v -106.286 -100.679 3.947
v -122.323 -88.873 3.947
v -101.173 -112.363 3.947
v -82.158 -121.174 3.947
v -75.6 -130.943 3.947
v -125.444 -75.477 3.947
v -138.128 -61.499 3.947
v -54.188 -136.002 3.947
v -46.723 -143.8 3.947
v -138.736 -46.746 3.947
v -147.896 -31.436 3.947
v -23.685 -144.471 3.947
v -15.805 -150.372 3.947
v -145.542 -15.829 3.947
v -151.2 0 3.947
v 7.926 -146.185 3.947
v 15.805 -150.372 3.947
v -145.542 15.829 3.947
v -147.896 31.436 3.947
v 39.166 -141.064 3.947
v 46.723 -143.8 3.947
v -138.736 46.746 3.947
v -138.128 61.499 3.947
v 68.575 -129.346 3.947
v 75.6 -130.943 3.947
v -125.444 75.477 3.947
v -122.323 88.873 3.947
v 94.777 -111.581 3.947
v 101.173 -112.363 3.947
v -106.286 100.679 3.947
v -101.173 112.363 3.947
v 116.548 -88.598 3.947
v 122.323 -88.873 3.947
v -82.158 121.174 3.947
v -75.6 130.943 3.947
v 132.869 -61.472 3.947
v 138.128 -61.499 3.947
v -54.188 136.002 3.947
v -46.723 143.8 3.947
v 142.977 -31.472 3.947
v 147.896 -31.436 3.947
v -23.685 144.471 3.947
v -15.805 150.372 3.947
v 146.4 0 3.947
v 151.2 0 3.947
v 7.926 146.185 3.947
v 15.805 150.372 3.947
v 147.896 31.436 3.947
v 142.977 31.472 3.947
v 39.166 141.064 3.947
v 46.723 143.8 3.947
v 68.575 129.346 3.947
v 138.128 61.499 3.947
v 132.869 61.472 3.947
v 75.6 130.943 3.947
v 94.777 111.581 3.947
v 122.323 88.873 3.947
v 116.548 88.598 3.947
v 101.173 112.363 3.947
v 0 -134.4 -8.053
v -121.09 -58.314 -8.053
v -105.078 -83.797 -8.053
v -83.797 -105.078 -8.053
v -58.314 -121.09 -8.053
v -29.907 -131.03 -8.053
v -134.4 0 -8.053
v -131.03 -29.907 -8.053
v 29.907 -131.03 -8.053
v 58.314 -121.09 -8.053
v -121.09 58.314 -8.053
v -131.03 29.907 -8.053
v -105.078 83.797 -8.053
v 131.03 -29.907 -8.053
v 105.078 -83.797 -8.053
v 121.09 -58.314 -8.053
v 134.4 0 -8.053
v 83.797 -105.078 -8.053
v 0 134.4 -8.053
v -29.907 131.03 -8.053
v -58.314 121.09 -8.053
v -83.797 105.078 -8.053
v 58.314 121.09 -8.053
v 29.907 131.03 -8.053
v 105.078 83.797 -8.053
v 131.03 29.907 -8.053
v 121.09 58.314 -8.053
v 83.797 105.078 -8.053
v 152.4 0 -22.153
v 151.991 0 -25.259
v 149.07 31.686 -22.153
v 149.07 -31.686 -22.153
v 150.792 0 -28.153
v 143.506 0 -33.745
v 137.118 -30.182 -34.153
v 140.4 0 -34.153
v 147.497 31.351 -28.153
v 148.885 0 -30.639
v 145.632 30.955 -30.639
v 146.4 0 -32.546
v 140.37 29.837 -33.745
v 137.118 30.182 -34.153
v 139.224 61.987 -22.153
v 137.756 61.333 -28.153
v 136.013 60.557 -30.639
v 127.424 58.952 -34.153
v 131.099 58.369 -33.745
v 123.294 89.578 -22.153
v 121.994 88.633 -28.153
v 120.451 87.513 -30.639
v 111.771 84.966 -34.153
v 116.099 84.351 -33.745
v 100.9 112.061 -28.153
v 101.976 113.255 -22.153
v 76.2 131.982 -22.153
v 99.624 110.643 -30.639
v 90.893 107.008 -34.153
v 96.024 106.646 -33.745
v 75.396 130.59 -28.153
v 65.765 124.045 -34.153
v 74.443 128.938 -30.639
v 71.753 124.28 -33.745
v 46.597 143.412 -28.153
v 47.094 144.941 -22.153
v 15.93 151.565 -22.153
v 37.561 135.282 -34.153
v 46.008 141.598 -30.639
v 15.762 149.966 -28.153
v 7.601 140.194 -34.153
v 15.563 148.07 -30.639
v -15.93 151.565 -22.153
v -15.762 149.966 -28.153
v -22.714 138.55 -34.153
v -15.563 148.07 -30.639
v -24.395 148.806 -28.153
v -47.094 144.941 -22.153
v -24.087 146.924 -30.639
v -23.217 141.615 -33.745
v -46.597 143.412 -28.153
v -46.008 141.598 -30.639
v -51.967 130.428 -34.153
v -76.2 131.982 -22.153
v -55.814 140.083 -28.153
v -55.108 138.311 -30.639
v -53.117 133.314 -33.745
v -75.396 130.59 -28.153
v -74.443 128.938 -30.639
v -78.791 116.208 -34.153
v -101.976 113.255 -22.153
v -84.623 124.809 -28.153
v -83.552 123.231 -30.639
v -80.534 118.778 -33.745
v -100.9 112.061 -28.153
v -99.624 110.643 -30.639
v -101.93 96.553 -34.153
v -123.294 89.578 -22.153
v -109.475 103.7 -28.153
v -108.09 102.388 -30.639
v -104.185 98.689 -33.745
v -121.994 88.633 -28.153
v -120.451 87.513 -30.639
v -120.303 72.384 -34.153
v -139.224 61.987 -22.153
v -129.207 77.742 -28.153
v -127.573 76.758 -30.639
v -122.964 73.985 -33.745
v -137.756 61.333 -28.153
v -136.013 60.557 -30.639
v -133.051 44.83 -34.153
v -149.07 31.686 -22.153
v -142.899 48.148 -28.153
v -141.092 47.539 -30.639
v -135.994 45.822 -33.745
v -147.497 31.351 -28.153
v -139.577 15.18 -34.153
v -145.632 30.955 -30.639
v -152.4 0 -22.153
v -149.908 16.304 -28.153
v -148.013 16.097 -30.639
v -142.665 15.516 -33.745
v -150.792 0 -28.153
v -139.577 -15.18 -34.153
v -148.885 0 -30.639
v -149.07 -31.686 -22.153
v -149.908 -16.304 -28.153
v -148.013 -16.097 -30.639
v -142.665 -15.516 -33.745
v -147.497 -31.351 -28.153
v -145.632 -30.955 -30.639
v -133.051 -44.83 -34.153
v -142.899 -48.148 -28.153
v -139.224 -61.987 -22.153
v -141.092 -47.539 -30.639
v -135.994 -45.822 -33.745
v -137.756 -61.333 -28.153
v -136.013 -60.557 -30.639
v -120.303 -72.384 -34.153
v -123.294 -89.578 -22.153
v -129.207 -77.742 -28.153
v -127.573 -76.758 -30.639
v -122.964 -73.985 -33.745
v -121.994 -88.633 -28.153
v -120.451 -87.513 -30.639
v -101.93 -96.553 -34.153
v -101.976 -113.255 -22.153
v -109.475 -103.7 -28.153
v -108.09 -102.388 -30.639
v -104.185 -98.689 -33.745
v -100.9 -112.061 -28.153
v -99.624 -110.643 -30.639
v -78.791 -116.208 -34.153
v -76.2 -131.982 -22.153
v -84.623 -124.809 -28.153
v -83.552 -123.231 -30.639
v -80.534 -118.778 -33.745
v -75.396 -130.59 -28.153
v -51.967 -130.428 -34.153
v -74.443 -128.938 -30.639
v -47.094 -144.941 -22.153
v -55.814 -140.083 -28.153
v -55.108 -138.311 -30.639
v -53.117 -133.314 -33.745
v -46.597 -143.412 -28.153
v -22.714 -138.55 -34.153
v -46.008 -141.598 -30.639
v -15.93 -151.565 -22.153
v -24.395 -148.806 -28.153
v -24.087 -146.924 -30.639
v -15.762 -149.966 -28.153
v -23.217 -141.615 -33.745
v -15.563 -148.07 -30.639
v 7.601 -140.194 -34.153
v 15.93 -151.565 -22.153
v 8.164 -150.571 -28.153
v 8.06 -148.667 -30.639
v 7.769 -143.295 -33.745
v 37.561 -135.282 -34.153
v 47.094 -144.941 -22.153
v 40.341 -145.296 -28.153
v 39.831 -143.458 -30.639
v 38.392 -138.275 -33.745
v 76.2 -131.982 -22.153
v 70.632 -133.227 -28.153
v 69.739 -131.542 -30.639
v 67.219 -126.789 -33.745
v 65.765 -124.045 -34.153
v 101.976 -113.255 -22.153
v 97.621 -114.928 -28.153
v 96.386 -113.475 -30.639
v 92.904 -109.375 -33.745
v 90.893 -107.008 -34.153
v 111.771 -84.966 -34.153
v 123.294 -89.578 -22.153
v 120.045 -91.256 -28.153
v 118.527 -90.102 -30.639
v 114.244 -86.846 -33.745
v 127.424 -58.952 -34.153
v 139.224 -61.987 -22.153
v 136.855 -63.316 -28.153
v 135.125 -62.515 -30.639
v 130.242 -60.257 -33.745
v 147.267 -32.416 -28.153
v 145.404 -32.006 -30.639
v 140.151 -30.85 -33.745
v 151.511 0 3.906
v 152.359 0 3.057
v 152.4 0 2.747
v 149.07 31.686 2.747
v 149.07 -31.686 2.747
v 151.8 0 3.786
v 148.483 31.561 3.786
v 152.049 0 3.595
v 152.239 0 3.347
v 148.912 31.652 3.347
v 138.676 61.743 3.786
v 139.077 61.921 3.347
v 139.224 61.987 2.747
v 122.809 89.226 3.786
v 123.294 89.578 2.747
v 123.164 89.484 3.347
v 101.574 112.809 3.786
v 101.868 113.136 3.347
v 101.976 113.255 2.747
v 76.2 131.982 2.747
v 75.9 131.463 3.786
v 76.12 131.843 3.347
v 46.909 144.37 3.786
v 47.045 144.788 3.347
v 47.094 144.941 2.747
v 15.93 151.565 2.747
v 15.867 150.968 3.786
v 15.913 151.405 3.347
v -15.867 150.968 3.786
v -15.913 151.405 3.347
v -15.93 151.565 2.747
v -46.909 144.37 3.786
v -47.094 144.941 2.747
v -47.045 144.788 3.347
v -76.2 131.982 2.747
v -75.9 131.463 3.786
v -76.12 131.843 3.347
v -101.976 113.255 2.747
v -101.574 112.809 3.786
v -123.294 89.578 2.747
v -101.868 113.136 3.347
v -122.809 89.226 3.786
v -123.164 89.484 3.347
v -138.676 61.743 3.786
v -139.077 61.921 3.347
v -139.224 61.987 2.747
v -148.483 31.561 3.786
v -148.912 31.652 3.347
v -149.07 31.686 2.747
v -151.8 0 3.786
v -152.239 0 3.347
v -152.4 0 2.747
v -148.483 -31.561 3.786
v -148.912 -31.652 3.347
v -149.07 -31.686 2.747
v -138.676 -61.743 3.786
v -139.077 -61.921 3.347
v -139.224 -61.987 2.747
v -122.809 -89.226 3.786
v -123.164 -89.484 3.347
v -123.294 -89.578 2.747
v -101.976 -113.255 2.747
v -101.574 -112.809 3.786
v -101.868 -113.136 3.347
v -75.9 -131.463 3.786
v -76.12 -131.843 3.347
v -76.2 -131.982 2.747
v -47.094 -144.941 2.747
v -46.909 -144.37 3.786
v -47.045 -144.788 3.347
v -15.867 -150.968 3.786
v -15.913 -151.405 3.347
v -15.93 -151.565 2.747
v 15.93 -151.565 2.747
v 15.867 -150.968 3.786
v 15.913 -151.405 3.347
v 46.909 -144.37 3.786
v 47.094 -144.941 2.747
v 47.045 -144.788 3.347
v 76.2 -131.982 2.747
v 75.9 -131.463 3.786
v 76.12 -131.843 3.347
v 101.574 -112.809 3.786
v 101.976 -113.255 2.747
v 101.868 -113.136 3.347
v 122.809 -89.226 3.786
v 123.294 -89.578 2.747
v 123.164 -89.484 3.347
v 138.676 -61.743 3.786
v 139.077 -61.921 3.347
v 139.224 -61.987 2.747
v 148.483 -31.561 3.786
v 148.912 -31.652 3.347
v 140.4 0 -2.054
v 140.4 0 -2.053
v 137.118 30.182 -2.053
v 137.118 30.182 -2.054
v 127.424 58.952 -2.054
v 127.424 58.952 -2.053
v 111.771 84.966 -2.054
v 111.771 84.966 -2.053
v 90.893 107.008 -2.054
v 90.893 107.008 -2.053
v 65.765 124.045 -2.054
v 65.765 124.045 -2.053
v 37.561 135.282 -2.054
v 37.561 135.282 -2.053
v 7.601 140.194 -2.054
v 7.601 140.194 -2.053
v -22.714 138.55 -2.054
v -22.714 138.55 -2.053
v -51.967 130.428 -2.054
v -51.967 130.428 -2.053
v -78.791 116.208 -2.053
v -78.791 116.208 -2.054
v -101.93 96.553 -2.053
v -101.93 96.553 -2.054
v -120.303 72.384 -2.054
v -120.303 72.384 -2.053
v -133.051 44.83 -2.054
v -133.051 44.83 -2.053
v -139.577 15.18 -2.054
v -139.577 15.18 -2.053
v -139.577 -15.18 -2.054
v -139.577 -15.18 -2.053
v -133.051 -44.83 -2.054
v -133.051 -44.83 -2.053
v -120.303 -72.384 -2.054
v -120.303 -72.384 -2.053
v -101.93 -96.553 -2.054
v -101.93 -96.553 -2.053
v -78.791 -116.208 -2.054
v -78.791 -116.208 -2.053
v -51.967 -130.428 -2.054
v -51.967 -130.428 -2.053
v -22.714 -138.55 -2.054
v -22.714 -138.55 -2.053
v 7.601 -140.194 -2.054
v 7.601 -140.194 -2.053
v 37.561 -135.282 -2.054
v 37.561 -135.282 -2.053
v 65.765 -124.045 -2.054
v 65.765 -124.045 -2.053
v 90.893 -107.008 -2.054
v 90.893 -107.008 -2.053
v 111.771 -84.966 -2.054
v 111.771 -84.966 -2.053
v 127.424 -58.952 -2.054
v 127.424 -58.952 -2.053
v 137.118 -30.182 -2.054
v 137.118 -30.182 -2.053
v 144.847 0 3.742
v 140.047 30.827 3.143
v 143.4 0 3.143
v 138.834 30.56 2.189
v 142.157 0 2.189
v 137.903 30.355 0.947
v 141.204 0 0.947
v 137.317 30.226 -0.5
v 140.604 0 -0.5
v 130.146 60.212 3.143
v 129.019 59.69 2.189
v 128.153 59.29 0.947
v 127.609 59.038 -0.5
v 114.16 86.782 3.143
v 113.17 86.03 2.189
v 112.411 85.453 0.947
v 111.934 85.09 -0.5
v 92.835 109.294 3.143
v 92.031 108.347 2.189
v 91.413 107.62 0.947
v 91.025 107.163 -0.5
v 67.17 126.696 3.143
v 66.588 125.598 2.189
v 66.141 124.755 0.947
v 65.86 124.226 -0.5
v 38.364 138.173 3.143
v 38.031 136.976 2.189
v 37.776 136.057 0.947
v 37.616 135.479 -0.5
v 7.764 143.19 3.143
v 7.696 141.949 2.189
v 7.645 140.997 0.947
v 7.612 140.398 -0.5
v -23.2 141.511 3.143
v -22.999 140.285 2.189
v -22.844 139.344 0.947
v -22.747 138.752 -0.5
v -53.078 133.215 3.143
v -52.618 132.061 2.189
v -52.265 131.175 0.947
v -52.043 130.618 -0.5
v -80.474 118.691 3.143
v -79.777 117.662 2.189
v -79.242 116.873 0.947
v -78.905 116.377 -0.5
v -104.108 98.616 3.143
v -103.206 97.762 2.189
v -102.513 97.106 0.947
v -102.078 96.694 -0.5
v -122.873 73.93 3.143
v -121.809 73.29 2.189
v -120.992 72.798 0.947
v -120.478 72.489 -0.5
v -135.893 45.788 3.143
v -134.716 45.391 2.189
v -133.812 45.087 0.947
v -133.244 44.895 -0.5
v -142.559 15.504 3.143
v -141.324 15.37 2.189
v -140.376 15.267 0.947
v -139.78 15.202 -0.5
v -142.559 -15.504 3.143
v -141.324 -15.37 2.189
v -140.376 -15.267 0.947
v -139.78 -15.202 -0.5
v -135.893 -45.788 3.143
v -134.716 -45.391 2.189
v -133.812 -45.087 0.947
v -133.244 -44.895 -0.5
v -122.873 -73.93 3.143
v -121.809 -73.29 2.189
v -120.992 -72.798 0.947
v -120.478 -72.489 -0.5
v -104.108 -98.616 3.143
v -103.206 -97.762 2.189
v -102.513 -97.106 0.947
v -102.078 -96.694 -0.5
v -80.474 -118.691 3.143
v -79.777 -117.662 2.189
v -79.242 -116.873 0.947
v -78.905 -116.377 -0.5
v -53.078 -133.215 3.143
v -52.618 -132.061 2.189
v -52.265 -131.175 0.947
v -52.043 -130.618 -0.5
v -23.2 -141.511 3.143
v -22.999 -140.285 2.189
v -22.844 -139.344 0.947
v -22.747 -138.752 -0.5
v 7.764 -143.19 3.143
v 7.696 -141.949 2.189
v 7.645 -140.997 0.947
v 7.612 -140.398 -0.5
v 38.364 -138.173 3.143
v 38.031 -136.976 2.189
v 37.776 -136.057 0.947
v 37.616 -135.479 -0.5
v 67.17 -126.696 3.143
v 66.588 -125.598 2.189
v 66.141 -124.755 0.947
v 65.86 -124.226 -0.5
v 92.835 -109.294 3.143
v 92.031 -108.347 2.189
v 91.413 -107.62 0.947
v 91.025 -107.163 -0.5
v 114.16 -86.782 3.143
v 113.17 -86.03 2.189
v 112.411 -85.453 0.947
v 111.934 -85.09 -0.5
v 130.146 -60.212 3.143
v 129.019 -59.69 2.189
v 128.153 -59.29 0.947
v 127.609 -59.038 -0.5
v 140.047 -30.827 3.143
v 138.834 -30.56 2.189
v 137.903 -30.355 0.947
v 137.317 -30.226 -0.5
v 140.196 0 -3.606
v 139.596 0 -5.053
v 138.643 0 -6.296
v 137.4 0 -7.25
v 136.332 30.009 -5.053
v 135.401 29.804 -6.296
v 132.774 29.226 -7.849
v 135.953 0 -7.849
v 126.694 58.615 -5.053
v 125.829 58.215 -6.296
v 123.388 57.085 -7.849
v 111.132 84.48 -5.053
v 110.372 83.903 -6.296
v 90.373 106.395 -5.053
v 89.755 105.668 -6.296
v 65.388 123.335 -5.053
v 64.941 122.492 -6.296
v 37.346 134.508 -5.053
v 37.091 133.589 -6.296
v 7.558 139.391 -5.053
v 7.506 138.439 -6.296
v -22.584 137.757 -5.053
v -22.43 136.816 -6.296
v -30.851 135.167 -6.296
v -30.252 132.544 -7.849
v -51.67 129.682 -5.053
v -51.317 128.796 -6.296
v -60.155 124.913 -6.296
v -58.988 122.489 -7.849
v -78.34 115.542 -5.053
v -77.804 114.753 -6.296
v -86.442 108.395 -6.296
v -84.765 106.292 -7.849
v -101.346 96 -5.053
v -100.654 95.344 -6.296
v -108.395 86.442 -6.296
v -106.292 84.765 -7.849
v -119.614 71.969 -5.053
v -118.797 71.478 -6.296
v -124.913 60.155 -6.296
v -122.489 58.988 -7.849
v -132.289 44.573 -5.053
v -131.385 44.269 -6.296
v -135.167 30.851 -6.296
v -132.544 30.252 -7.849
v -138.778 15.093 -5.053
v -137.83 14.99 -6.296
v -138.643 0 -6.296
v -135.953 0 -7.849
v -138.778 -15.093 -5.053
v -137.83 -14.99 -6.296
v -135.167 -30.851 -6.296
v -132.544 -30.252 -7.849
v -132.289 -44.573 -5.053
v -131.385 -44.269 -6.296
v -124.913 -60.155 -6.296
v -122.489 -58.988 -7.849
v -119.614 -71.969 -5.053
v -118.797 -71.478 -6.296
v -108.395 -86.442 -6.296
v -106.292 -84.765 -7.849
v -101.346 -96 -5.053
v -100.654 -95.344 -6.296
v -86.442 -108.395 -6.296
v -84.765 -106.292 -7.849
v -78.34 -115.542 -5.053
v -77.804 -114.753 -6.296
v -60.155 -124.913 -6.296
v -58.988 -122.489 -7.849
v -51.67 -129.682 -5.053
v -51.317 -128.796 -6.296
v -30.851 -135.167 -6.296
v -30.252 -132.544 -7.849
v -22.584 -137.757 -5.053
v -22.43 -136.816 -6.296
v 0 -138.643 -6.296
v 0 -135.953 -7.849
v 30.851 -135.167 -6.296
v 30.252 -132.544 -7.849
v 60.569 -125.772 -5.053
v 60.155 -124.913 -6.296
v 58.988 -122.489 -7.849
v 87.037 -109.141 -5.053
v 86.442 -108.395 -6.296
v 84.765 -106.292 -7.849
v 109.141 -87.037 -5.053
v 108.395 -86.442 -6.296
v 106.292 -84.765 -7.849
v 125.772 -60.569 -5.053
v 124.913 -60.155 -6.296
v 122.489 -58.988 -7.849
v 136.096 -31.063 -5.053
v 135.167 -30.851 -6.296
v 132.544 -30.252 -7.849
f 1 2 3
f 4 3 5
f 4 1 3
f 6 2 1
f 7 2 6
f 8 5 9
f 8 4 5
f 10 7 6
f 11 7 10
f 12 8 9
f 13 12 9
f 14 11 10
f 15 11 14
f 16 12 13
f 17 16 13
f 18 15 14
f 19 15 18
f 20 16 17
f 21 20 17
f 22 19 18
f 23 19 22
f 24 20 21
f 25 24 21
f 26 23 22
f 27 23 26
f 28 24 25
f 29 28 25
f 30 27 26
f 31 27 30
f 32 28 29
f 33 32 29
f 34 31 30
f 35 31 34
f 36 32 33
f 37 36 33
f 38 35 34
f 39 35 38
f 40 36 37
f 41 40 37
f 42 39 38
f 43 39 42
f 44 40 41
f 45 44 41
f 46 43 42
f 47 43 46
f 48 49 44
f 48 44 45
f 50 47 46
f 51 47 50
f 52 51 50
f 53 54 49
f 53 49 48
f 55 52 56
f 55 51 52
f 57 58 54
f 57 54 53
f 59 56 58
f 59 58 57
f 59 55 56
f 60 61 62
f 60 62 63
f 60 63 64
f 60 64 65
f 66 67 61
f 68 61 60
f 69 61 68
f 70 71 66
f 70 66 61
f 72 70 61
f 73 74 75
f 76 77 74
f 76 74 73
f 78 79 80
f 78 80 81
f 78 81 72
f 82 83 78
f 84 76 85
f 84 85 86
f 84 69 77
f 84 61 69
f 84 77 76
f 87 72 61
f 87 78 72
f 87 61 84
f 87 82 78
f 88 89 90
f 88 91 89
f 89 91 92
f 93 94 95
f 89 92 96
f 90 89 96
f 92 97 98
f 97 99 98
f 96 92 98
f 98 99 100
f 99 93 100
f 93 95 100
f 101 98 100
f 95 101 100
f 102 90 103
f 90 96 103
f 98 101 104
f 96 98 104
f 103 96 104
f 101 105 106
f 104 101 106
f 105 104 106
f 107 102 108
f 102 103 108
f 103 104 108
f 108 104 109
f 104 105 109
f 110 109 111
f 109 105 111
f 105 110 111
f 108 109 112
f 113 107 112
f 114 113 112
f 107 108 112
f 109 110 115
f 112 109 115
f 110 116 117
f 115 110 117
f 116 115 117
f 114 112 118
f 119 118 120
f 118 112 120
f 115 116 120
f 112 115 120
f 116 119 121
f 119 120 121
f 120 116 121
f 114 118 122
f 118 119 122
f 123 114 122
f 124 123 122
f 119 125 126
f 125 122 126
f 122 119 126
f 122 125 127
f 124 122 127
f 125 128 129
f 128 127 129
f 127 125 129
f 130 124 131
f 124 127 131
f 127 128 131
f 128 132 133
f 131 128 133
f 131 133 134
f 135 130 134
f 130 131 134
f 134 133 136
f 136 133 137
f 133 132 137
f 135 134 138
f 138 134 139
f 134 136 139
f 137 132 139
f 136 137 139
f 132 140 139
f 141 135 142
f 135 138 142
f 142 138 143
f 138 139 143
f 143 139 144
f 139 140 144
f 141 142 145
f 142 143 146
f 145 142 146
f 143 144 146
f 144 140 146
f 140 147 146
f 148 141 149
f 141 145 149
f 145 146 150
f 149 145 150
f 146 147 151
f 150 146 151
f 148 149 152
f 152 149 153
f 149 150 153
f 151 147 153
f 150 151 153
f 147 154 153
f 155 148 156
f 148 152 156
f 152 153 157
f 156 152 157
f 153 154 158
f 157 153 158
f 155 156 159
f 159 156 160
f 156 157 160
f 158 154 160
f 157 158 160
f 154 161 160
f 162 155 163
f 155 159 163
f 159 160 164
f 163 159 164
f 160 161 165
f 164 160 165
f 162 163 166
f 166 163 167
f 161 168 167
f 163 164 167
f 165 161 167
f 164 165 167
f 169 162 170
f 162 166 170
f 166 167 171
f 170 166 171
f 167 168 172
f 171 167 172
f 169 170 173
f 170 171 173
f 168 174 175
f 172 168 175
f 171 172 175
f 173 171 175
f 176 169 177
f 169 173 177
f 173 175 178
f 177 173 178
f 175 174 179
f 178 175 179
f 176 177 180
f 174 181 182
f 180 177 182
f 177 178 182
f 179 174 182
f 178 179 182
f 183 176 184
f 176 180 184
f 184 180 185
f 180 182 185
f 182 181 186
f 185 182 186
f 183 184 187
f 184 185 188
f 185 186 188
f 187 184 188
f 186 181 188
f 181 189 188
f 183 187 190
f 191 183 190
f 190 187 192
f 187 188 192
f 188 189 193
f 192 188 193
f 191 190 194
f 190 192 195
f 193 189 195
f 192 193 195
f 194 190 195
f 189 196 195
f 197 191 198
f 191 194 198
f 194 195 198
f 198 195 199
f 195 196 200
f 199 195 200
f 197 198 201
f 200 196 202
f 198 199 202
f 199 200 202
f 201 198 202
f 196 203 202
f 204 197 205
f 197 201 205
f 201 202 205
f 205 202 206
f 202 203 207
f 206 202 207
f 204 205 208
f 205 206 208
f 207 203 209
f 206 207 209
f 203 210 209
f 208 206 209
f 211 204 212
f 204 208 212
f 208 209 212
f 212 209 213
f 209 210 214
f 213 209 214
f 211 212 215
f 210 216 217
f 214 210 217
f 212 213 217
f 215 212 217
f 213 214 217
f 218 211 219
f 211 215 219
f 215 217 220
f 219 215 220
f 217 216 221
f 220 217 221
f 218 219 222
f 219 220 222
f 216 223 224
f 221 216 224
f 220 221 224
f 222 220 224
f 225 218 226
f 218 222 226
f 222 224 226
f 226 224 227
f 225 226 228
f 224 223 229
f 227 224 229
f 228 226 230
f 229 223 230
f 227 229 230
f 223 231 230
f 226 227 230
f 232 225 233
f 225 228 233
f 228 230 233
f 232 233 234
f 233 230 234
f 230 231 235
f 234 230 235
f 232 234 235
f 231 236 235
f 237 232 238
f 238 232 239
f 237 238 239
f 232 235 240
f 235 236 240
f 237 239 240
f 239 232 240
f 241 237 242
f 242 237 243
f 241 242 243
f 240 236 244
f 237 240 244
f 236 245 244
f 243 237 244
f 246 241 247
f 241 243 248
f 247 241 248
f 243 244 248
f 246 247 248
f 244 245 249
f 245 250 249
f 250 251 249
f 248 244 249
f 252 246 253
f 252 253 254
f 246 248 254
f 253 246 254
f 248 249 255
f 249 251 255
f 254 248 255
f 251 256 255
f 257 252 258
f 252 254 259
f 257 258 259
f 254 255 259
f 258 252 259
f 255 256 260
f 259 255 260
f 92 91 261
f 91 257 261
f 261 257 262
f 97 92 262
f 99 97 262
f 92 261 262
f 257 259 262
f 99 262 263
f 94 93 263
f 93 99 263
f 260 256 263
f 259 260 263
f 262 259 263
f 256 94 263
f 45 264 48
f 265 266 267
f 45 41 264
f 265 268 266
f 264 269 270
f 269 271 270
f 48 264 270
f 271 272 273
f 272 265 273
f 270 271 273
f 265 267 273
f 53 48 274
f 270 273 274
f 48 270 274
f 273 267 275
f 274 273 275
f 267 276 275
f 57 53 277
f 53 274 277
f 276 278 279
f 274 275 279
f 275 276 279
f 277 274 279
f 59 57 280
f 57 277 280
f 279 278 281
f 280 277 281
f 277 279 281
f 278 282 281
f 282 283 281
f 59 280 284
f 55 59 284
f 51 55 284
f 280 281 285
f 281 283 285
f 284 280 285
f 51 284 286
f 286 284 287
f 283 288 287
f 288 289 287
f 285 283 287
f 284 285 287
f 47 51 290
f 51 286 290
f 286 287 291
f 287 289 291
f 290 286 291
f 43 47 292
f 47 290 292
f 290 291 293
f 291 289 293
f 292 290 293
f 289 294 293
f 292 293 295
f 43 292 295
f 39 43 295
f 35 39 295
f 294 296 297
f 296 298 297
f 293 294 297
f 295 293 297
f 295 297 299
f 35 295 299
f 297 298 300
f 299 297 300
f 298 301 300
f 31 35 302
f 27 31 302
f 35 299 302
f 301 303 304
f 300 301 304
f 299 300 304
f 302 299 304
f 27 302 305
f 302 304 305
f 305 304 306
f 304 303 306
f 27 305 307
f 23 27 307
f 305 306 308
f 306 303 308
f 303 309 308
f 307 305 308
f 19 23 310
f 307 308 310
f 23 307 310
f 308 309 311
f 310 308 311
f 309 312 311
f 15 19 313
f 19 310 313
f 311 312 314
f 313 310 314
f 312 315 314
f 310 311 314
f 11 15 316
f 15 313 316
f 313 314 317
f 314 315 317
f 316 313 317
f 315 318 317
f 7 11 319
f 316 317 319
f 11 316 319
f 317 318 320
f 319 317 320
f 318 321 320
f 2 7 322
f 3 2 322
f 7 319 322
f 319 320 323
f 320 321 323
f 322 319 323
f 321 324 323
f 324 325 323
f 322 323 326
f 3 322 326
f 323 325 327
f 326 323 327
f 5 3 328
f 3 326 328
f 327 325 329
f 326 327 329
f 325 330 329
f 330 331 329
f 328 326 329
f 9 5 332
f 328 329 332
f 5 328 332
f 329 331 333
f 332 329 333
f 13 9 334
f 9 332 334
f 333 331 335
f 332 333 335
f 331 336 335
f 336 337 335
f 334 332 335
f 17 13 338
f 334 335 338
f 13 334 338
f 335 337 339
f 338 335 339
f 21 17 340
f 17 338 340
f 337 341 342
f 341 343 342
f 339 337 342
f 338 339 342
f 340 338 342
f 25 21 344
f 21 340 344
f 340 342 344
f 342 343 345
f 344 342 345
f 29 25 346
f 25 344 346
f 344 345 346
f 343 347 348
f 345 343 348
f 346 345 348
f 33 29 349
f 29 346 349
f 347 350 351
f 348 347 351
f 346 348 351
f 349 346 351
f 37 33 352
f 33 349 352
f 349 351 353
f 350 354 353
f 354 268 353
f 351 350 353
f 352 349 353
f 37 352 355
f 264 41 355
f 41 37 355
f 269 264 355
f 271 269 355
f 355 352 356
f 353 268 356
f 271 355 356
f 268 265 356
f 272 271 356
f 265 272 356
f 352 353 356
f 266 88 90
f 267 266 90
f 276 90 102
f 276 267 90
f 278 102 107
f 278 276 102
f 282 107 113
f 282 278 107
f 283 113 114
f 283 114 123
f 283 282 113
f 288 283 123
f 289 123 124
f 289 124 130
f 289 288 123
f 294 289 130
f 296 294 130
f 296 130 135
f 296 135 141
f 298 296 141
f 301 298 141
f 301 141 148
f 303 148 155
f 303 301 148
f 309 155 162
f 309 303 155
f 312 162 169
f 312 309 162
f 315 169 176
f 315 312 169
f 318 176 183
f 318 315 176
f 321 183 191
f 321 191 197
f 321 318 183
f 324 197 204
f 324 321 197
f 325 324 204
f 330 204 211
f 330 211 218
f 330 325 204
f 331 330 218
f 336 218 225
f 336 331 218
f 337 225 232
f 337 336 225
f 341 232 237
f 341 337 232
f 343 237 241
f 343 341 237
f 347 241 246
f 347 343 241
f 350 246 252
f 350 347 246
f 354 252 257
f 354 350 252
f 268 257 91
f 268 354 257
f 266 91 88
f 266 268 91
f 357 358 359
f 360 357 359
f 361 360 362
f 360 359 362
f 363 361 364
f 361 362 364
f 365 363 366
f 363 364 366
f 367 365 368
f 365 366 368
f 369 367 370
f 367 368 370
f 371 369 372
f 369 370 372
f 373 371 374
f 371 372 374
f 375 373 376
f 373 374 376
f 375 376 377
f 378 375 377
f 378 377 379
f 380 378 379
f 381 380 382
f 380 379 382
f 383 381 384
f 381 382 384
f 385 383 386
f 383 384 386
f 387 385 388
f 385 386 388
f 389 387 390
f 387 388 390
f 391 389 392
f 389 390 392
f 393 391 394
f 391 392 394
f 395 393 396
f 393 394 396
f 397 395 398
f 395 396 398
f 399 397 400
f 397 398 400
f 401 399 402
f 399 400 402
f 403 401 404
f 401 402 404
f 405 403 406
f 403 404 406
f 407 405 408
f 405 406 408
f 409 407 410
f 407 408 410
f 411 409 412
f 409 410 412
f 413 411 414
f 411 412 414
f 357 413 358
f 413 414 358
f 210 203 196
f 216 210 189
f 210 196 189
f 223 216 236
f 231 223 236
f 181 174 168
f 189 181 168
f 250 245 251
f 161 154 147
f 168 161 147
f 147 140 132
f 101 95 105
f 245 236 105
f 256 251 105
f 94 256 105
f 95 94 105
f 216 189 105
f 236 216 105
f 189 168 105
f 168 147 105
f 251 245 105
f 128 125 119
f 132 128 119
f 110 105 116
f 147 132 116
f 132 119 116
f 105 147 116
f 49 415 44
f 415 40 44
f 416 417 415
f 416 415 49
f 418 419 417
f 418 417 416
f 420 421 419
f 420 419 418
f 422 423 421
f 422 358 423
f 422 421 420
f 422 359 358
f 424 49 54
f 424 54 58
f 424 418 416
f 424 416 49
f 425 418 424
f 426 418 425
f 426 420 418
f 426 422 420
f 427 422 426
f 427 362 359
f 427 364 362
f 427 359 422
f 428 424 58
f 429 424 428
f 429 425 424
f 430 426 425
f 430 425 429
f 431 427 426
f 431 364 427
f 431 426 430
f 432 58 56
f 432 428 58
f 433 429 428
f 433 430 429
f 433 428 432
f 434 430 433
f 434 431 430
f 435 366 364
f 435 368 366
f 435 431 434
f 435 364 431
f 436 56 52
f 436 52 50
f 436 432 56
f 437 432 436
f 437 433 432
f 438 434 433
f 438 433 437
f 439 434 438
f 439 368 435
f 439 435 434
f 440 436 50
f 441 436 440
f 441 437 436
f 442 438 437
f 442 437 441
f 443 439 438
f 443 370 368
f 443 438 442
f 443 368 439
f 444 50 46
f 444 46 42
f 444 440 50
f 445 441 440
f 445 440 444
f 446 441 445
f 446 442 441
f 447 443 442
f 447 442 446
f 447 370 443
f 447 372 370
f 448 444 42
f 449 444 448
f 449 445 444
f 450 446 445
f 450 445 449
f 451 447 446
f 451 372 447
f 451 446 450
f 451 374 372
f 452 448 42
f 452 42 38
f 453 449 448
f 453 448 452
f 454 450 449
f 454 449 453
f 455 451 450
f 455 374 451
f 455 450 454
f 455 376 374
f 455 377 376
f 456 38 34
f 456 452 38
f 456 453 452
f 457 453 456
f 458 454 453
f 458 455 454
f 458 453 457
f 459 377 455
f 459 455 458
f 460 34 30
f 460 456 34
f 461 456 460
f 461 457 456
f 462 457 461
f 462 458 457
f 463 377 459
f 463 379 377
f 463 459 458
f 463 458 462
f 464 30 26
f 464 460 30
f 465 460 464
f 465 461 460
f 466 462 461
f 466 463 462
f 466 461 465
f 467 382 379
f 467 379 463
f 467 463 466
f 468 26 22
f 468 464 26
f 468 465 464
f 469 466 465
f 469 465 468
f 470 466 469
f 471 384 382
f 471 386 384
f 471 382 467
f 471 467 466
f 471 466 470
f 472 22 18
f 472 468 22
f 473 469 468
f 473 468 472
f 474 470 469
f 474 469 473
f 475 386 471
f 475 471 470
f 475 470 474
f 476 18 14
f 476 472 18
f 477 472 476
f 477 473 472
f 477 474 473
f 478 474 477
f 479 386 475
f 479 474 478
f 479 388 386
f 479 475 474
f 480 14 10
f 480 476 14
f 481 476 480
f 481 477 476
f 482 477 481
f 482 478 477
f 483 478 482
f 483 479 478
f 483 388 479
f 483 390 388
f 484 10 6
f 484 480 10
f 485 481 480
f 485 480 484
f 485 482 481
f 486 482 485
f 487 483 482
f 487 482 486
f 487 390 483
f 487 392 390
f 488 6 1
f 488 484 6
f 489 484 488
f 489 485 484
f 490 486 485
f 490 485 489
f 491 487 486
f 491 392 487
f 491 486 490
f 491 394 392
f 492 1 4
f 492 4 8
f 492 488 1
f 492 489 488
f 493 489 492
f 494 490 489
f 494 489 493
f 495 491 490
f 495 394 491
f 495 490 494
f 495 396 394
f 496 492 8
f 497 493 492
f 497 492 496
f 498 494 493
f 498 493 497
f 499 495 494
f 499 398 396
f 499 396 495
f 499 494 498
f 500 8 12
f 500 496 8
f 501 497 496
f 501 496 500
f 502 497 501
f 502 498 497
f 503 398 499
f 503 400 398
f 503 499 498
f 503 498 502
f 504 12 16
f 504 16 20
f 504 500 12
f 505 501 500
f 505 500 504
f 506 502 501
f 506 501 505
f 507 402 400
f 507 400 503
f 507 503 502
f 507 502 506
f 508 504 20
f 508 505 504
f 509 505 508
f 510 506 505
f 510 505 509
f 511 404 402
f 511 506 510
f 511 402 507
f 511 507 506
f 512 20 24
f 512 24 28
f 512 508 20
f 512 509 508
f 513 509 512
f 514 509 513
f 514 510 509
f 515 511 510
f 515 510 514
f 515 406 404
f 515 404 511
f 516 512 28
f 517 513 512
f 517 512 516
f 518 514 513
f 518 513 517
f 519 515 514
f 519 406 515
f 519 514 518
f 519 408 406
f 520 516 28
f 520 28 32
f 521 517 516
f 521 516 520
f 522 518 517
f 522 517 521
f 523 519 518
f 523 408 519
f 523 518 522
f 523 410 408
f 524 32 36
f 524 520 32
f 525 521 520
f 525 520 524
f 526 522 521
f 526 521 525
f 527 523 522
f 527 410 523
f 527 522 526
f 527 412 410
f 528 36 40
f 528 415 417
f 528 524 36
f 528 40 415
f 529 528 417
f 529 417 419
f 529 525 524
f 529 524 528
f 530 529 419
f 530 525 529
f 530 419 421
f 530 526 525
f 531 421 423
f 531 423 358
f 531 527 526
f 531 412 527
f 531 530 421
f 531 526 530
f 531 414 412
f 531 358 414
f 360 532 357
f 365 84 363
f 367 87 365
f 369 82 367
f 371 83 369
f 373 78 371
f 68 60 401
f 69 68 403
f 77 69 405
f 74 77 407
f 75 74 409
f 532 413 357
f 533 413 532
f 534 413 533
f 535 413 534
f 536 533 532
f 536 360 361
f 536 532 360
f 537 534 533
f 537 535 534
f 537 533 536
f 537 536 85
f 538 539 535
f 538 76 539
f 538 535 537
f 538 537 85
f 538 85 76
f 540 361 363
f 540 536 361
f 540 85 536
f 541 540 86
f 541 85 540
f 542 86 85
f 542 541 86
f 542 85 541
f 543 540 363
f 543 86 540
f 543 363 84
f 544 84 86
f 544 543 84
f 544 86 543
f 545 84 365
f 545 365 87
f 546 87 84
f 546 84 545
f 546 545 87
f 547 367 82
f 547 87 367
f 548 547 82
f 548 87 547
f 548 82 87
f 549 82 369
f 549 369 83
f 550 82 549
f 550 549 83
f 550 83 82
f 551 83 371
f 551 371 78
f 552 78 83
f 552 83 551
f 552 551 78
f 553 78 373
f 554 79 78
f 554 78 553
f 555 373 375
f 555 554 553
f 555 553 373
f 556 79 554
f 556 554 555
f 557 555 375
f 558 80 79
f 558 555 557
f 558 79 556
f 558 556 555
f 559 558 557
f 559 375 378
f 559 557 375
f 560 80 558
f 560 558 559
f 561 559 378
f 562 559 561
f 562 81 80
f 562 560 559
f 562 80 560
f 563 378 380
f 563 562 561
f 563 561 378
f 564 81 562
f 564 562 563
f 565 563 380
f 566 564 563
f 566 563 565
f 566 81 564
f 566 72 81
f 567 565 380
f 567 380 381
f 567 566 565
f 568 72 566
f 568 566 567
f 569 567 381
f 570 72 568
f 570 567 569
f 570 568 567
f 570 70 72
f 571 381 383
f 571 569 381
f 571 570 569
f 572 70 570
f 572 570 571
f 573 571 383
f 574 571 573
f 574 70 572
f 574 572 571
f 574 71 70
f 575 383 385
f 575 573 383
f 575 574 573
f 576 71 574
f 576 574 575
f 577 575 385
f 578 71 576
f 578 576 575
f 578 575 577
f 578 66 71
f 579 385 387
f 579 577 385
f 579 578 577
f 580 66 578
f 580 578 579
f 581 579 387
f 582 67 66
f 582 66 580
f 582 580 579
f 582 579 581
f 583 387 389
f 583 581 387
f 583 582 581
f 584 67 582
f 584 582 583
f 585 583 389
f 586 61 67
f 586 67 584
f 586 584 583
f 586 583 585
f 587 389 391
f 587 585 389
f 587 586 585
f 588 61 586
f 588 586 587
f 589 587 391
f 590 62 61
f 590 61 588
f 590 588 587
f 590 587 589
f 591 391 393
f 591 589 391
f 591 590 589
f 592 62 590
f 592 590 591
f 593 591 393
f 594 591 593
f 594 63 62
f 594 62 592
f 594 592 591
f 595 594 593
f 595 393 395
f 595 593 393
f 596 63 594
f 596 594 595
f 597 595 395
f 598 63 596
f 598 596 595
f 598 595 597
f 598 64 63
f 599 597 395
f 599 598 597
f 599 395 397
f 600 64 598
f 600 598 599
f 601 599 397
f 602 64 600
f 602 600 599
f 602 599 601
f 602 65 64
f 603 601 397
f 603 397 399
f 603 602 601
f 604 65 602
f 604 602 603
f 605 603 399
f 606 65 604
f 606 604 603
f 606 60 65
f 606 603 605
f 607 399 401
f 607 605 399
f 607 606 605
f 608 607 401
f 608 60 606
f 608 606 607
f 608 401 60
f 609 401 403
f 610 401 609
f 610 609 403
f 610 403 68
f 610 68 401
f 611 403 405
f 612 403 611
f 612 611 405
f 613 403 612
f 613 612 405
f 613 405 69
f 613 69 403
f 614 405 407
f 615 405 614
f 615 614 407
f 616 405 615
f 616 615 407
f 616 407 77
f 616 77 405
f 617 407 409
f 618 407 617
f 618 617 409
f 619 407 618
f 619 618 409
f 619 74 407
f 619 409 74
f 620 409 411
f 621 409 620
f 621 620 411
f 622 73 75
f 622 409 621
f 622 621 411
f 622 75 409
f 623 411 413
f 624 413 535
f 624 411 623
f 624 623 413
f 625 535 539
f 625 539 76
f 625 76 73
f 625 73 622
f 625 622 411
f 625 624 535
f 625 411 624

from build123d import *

# Parameters (mm, degrees)
SKETCH1_R          = 127
BASE_EXTRUDE_DEPTH = 31.75
SKETCH3_R          = 117
CUT_EXTRUDE1_DEPTH = 10
FILLET1_R          = 5
FILLET2_R          = 5
FILLET3_R          = 1
FILLET4_R          = 10
SCALE2_SCALE       = 1.2


with BuildPart() as part:
    # Sketch1 → Base-Extrude (new body)
    with BuildSketch(Plane.XY):
        Circle(SKETCH1_R)
    extrude(amount=-BASE_EXTRUDE_DEPTH)

    # Sketch3 → Cut-Extrude1 (cut)
    with BuildSketch(Plane.XY):
        Circle(SKETCH3_R)
    extrude(amount=-CUT_EXTRUDE1_DEPTH, mode=Mode.SUBTRACT)

    # Fillet1
    fillet1_edges = [part.edges().sort_by_distance(p)[0] for p in [
        (-117, 0, 0),
    ]]
    fillet(fillet1_edges, radius=FILLET1_R)

    # Fillet2
    fillet2_edges = [part.edges().sort_by_distance(p)[0] for p in [
        (-117, 0, -10),
    ]]
    fillet(fillet2_edges, radius=FILLET2_R - 0.0001)  # a hair under: the kernel refuses the full size

    # Fillet3
    fillet3_edges = [part.edges().sort_by_distance(p)[0] for p in [
        (-127, 0, 0),
    ]]
    fillet(fillet3_edges, radius=FILLET3_R)

    # Fillet4
    fillet4_edges = [part.edges().sort_by_distance(p)[0] for p in [
        (-127, 0, -31.75),
    ]]
    fillet(fillet4_edges, radius=FILLET4_R)


with BuildPart() as part_1:
    # Scale2: scaled about (0, 0, -19.732997693)
    add(part.part.scale(SCALE2_SCALE).moved(Location((0, 0, 3.946599539))))


solid = part_1.part
